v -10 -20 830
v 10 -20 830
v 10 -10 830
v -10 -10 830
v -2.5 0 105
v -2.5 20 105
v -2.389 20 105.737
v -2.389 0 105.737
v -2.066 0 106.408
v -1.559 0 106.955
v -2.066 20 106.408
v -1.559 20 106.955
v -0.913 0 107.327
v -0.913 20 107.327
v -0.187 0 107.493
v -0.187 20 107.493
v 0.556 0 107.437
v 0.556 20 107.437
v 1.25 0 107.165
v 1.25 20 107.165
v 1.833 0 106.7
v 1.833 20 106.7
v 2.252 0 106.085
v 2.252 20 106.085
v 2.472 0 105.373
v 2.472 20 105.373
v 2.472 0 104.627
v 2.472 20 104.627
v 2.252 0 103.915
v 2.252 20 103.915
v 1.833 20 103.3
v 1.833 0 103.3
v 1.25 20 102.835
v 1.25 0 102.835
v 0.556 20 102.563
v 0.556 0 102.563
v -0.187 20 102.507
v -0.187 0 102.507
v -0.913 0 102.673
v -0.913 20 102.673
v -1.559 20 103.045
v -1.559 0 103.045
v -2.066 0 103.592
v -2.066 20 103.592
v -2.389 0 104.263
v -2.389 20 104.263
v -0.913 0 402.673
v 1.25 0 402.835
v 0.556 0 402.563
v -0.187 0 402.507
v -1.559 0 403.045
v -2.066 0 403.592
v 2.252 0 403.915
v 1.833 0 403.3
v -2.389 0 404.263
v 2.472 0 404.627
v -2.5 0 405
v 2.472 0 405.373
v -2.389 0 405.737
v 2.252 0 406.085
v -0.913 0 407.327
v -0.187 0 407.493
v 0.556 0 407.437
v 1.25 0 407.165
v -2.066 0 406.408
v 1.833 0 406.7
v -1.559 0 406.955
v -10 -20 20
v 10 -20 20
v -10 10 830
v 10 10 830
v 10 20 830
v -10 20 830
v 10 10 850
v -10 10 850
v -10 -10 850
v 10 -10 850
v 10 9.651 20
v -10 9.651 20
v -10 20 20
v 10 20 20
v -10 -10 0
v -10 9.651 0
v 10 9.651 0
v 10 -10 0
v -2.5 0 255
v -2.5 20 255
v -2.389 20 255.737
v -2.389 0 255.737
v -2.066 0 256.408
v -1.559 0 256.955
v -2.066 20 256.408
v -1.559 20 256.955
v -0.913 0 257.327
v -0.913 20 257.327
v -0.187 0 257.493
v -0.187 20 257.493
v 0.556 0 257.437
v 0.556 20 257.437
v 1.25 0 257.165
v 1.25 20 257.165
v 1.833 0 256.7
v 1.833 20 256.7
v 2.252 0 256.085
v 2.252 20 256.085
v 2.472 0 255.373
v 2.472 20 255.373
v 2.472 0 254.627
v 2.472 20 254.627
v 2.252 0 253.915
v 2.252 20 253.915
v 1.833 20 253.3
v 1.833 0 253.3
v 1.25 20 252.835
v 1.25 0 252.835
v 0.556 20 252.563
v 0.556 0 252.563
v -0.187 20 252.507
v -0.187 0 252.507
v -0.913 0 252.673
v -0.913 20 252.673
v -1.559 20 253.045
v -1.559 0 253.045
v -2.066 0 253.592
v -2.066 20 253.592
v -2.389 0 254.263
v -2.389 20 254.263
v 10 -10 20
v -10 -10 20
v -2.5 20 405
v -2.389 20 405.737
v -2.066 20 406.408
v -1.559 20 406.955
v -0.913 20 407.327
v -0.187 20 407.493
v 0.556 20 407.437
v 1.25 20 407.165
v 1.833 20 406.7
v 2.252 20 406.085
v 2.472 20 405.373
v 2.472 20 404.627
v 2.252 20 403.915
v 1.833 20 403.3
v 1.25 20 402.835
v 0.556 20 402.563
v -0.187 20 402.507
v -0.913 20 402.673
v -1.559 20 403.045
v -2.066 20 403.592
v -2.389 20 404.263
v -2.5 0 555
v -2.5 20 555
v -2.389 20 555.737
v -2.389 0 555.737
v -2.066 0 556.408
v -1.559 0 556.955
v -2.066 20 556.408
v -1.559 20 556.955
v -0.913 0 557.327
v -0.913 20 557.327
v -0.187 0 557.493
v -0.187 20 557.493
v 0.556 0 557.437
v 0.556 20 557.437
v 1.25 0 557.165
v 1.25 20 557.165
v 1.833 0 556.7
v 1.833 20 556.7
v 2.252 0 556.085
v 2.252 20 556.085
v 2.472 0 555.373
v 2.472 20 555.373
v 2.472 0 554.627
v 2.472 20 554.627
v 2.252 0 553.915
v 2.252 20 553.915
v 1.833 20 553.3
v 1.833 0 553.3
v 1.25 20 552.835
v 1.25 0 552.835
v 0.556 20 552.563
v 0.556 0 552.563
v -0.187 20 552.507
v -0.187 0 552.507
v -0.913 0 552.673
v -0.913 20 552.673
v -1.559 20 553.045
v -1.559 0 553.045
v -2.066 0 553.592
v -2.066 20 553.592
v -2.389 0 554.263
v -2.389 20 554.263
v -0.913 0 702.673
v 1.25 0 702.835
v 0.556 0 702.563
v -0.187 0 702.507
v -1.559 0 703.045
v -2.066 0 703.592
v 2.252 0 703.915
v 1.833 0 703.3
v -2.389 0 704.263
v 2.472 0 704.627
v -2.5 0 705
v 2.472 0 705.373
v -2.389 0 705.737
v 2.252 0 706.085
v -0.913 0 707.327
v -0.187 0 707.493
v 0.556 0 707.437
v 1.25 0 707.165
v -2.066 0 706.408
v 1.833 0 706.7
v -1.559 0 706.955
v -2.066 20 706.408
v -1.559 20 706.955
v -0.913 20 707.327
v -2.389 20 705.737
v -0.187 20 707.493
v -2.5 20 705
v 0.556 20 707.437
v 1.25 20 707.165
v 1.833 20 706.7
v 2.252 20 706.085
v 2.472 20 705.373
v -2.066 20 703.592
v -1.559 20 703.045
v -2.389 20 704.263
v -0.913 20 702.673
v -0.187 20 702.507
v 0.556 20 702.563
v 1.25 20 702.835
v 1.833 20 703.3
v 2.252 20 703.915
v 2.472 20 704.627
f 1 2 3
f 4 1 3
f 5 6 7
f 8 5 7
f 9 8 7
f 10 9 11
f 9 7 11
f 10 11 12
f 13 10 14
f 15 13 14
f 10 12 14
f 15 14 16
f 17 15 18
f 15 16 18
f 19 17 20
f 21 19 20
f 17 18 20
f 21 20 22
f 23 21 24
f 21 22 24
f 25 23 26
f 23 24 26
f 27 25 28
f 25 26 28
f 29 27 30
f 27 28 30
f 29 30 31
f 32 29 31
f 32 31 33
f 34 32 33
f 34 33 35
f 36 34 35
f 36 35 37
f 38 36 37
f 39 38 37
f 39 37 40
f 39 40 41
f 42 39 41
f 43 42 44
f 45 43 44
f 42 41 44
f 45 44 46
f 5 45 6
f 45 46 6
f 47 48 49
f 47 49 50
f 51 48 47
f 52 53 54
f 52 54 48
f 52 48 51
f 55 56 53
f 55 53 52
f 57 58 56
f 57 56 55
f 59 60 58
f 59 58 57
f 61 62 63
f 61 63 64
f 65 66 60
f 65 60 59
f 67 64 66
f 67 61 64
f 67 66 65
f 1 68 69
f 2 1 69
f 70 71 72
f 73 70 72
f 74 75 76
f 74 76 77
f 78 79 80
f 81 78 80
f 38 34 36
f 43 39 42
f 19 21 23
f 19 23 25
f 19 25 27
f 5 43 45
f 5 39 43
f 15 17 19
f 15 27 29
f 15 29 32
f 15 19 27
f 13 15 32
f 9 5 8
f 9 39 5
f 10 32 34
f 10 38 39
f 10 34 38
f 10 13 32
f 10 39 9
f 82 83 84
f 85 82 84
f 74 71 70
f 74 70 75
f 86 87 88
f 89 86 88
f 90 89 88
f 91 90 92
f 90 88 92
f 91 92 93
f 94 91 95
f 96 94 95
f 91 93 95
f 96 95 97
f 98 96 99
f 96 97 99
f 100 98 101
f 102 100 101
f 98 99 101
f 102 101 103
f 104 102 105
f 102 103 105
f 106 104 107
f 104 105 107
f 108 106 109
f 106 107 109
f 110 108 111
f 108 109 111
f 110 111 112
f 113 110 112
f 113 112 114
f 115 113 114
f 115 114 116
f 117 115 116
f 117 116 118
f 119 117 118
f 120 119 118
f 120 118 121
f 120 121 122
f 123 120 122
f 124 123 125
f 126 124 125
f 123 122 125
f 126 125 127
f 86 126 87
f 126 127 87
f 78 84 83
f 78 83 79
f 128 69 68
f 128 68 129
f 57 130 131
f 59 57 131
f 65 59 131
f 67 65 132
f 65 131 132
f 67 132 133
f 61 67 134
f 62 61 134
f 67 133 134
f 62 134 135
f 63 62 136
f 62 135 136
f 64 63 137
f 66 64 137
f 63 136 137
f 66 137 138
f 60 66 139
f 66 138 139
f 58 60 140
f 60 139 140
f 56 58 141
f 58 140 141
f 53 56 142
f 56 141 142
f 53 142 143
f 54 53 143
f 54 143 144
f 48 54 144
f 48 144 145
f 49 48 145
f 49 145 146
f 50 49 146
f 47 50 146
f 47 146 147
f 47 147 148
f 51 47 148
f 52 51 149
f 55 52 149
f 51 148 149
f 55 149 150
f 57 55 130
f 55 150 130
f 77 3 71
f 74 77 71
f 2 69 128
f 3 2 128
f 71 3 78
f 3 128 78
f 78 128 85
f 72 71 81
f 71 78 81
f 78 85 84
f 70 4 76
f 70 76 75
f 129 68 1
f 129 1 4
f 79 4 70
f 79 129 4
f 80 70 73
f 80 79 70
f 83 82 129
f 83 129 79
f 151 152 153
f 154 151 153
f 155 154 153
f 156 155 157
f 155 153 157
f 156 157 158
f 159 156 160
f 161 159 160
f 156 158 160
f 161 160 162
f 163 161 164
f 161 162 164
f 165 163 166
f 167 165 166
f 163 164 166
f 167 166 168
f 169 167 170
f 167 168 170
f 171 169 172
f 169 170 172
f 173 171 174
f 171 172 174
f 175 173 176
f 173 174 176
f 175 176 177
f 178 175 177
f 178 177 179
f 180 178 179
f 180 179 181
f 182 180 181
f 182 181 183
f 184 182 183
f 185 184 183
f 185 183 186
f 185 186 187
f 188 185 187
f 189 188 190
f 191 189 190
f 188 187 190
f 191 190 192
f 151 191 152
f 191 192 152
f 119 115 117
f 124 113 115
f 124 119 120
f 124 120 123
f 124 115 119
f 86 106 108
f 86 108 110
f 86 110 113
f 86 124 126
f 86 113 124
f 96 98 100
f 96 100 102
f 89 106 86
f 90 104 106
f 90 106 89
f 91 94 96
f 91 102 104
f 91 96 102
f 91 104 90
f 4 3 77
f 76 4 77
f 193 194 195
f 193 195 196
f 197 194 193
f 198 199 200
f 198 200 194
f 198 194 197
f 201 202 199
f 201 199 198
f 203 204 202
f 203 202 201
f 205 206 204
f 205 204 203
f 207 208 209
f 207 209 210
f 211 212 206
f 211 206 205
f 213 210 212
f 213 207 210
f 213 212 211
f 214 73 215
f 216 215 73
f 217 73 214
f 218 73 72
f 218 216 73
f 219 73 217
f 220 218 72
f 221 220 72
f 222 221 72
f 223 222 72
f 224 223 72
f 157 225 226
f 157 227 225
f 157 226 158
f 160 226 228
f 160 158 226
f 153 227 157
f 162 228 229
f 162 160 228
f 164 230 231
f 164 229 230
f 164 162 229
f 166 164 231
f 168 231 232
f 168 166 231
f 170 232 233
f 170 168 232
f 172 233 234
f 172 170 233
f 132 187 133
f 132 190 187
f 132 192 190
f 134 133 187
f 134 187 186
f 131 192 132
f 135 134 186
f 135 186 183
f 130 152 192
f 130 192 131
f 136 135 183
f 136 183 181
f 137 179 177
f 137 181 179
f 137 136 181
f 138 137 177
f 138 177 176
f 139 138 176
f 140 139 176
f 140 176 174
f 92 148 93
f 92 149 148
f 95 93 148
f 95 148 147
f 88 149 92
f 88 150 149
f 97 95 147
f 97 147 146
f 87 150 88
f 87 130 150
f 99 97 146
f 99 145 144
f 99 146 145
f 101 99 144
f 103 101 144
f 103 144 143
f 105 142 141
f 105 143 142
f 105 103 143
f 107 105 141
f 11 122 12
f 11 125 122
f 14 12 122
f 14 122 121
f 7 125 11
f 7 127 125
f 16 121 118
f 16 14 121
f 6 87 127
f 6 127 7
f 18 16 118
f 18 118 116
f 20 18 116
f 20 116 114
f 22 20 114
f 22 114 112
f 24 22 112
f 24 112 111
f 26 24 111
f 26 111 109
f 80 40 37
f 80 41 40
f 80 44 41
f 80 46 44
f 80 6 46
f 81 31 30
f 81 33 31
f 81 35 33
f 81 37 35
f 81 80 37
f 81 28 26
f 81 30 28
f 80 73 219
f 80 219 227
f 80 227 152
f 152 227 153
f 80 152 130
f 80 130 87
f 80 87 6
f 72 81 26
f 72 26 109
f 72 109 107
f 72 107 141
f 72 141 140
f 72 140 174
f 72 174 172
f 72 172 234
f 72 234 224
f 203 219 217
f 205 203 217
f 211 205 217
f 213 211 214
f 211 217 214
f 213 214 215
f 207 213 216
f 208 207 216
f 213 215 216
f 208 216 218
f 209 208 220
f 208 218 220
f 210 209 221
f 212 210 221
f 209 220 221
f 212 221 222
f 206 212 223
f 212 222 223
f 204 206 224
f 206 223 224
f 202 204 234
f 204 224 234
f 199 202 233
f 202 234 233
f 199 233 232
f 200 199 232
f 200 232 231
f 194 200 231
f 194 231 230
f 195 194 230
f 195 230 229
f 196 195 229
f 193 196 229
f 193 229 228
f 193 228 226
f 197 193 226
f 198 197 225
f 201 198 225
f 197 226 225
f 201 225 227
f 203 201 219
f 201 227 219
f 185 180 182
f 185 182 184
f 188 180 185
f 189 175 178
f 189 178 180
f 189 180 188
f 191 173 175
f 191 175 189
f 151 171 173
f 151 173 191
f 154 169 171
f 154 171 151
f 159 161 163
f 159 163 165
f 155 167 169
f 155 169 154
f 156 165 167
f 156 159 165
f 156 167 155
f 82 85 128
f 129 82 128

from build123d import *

# Parameters (mm, degrees)
F0_W     = 20
F0_H     = 40
F1_DEPTH = 850
F2_R     = 2.5
F3_DEPTH = 20
F4_W     = 10
F4_H     = 20
F4_W_2   = 10.3488773853
F5_DEPTH = 500


with BuildPart() as f1:
    # F0 (on Top) → F1 (new body)
    with BuildSketch(Plane.XY):
        Rectangle(F0_W, F0_H)
    extrude(amount=F1_DEPTH)

    # F2 (on face) → F3 (cut)
    with BuildSketch(Plane(origin=(0, 20, 0), x_dir=(-1, 0, 0), z_dir=(0, 1, 0))):
        with Locations((0, 555)):
            Circle(F2_R)
        with Locations((0, 705)):
            Circle(F2_R)
        with Locations((0, 255)):
            Circle(F2_R)
        with Locations((0, 105)):
            Circle(F2_R)
        with Locations((0, 405)):
            Circle(F2_R)
    extrude(amount=-F3_DEPTH, mode=Mode.SUBTRACT)

    # F4 (on face) → F5 (cut)
    with BuildSketch(Plane.YZ.offset(10)):
        with Locations((-15, 840)):
            Rectangle(F4_W, F4_H)
        with Locations((15, 840)):
            Rectangle(F4_W, F4_H)
        with Locations((14.8255613074, 10)):
            Rectangle(F4_W_2, F4_H)
        with Locations((-15, 10)):
            Rectangle(F4_W, F4_H)
    extrude(amount=-F5_DEPTH, mode=Mode.SUBTRACT)


solid = f1.part
